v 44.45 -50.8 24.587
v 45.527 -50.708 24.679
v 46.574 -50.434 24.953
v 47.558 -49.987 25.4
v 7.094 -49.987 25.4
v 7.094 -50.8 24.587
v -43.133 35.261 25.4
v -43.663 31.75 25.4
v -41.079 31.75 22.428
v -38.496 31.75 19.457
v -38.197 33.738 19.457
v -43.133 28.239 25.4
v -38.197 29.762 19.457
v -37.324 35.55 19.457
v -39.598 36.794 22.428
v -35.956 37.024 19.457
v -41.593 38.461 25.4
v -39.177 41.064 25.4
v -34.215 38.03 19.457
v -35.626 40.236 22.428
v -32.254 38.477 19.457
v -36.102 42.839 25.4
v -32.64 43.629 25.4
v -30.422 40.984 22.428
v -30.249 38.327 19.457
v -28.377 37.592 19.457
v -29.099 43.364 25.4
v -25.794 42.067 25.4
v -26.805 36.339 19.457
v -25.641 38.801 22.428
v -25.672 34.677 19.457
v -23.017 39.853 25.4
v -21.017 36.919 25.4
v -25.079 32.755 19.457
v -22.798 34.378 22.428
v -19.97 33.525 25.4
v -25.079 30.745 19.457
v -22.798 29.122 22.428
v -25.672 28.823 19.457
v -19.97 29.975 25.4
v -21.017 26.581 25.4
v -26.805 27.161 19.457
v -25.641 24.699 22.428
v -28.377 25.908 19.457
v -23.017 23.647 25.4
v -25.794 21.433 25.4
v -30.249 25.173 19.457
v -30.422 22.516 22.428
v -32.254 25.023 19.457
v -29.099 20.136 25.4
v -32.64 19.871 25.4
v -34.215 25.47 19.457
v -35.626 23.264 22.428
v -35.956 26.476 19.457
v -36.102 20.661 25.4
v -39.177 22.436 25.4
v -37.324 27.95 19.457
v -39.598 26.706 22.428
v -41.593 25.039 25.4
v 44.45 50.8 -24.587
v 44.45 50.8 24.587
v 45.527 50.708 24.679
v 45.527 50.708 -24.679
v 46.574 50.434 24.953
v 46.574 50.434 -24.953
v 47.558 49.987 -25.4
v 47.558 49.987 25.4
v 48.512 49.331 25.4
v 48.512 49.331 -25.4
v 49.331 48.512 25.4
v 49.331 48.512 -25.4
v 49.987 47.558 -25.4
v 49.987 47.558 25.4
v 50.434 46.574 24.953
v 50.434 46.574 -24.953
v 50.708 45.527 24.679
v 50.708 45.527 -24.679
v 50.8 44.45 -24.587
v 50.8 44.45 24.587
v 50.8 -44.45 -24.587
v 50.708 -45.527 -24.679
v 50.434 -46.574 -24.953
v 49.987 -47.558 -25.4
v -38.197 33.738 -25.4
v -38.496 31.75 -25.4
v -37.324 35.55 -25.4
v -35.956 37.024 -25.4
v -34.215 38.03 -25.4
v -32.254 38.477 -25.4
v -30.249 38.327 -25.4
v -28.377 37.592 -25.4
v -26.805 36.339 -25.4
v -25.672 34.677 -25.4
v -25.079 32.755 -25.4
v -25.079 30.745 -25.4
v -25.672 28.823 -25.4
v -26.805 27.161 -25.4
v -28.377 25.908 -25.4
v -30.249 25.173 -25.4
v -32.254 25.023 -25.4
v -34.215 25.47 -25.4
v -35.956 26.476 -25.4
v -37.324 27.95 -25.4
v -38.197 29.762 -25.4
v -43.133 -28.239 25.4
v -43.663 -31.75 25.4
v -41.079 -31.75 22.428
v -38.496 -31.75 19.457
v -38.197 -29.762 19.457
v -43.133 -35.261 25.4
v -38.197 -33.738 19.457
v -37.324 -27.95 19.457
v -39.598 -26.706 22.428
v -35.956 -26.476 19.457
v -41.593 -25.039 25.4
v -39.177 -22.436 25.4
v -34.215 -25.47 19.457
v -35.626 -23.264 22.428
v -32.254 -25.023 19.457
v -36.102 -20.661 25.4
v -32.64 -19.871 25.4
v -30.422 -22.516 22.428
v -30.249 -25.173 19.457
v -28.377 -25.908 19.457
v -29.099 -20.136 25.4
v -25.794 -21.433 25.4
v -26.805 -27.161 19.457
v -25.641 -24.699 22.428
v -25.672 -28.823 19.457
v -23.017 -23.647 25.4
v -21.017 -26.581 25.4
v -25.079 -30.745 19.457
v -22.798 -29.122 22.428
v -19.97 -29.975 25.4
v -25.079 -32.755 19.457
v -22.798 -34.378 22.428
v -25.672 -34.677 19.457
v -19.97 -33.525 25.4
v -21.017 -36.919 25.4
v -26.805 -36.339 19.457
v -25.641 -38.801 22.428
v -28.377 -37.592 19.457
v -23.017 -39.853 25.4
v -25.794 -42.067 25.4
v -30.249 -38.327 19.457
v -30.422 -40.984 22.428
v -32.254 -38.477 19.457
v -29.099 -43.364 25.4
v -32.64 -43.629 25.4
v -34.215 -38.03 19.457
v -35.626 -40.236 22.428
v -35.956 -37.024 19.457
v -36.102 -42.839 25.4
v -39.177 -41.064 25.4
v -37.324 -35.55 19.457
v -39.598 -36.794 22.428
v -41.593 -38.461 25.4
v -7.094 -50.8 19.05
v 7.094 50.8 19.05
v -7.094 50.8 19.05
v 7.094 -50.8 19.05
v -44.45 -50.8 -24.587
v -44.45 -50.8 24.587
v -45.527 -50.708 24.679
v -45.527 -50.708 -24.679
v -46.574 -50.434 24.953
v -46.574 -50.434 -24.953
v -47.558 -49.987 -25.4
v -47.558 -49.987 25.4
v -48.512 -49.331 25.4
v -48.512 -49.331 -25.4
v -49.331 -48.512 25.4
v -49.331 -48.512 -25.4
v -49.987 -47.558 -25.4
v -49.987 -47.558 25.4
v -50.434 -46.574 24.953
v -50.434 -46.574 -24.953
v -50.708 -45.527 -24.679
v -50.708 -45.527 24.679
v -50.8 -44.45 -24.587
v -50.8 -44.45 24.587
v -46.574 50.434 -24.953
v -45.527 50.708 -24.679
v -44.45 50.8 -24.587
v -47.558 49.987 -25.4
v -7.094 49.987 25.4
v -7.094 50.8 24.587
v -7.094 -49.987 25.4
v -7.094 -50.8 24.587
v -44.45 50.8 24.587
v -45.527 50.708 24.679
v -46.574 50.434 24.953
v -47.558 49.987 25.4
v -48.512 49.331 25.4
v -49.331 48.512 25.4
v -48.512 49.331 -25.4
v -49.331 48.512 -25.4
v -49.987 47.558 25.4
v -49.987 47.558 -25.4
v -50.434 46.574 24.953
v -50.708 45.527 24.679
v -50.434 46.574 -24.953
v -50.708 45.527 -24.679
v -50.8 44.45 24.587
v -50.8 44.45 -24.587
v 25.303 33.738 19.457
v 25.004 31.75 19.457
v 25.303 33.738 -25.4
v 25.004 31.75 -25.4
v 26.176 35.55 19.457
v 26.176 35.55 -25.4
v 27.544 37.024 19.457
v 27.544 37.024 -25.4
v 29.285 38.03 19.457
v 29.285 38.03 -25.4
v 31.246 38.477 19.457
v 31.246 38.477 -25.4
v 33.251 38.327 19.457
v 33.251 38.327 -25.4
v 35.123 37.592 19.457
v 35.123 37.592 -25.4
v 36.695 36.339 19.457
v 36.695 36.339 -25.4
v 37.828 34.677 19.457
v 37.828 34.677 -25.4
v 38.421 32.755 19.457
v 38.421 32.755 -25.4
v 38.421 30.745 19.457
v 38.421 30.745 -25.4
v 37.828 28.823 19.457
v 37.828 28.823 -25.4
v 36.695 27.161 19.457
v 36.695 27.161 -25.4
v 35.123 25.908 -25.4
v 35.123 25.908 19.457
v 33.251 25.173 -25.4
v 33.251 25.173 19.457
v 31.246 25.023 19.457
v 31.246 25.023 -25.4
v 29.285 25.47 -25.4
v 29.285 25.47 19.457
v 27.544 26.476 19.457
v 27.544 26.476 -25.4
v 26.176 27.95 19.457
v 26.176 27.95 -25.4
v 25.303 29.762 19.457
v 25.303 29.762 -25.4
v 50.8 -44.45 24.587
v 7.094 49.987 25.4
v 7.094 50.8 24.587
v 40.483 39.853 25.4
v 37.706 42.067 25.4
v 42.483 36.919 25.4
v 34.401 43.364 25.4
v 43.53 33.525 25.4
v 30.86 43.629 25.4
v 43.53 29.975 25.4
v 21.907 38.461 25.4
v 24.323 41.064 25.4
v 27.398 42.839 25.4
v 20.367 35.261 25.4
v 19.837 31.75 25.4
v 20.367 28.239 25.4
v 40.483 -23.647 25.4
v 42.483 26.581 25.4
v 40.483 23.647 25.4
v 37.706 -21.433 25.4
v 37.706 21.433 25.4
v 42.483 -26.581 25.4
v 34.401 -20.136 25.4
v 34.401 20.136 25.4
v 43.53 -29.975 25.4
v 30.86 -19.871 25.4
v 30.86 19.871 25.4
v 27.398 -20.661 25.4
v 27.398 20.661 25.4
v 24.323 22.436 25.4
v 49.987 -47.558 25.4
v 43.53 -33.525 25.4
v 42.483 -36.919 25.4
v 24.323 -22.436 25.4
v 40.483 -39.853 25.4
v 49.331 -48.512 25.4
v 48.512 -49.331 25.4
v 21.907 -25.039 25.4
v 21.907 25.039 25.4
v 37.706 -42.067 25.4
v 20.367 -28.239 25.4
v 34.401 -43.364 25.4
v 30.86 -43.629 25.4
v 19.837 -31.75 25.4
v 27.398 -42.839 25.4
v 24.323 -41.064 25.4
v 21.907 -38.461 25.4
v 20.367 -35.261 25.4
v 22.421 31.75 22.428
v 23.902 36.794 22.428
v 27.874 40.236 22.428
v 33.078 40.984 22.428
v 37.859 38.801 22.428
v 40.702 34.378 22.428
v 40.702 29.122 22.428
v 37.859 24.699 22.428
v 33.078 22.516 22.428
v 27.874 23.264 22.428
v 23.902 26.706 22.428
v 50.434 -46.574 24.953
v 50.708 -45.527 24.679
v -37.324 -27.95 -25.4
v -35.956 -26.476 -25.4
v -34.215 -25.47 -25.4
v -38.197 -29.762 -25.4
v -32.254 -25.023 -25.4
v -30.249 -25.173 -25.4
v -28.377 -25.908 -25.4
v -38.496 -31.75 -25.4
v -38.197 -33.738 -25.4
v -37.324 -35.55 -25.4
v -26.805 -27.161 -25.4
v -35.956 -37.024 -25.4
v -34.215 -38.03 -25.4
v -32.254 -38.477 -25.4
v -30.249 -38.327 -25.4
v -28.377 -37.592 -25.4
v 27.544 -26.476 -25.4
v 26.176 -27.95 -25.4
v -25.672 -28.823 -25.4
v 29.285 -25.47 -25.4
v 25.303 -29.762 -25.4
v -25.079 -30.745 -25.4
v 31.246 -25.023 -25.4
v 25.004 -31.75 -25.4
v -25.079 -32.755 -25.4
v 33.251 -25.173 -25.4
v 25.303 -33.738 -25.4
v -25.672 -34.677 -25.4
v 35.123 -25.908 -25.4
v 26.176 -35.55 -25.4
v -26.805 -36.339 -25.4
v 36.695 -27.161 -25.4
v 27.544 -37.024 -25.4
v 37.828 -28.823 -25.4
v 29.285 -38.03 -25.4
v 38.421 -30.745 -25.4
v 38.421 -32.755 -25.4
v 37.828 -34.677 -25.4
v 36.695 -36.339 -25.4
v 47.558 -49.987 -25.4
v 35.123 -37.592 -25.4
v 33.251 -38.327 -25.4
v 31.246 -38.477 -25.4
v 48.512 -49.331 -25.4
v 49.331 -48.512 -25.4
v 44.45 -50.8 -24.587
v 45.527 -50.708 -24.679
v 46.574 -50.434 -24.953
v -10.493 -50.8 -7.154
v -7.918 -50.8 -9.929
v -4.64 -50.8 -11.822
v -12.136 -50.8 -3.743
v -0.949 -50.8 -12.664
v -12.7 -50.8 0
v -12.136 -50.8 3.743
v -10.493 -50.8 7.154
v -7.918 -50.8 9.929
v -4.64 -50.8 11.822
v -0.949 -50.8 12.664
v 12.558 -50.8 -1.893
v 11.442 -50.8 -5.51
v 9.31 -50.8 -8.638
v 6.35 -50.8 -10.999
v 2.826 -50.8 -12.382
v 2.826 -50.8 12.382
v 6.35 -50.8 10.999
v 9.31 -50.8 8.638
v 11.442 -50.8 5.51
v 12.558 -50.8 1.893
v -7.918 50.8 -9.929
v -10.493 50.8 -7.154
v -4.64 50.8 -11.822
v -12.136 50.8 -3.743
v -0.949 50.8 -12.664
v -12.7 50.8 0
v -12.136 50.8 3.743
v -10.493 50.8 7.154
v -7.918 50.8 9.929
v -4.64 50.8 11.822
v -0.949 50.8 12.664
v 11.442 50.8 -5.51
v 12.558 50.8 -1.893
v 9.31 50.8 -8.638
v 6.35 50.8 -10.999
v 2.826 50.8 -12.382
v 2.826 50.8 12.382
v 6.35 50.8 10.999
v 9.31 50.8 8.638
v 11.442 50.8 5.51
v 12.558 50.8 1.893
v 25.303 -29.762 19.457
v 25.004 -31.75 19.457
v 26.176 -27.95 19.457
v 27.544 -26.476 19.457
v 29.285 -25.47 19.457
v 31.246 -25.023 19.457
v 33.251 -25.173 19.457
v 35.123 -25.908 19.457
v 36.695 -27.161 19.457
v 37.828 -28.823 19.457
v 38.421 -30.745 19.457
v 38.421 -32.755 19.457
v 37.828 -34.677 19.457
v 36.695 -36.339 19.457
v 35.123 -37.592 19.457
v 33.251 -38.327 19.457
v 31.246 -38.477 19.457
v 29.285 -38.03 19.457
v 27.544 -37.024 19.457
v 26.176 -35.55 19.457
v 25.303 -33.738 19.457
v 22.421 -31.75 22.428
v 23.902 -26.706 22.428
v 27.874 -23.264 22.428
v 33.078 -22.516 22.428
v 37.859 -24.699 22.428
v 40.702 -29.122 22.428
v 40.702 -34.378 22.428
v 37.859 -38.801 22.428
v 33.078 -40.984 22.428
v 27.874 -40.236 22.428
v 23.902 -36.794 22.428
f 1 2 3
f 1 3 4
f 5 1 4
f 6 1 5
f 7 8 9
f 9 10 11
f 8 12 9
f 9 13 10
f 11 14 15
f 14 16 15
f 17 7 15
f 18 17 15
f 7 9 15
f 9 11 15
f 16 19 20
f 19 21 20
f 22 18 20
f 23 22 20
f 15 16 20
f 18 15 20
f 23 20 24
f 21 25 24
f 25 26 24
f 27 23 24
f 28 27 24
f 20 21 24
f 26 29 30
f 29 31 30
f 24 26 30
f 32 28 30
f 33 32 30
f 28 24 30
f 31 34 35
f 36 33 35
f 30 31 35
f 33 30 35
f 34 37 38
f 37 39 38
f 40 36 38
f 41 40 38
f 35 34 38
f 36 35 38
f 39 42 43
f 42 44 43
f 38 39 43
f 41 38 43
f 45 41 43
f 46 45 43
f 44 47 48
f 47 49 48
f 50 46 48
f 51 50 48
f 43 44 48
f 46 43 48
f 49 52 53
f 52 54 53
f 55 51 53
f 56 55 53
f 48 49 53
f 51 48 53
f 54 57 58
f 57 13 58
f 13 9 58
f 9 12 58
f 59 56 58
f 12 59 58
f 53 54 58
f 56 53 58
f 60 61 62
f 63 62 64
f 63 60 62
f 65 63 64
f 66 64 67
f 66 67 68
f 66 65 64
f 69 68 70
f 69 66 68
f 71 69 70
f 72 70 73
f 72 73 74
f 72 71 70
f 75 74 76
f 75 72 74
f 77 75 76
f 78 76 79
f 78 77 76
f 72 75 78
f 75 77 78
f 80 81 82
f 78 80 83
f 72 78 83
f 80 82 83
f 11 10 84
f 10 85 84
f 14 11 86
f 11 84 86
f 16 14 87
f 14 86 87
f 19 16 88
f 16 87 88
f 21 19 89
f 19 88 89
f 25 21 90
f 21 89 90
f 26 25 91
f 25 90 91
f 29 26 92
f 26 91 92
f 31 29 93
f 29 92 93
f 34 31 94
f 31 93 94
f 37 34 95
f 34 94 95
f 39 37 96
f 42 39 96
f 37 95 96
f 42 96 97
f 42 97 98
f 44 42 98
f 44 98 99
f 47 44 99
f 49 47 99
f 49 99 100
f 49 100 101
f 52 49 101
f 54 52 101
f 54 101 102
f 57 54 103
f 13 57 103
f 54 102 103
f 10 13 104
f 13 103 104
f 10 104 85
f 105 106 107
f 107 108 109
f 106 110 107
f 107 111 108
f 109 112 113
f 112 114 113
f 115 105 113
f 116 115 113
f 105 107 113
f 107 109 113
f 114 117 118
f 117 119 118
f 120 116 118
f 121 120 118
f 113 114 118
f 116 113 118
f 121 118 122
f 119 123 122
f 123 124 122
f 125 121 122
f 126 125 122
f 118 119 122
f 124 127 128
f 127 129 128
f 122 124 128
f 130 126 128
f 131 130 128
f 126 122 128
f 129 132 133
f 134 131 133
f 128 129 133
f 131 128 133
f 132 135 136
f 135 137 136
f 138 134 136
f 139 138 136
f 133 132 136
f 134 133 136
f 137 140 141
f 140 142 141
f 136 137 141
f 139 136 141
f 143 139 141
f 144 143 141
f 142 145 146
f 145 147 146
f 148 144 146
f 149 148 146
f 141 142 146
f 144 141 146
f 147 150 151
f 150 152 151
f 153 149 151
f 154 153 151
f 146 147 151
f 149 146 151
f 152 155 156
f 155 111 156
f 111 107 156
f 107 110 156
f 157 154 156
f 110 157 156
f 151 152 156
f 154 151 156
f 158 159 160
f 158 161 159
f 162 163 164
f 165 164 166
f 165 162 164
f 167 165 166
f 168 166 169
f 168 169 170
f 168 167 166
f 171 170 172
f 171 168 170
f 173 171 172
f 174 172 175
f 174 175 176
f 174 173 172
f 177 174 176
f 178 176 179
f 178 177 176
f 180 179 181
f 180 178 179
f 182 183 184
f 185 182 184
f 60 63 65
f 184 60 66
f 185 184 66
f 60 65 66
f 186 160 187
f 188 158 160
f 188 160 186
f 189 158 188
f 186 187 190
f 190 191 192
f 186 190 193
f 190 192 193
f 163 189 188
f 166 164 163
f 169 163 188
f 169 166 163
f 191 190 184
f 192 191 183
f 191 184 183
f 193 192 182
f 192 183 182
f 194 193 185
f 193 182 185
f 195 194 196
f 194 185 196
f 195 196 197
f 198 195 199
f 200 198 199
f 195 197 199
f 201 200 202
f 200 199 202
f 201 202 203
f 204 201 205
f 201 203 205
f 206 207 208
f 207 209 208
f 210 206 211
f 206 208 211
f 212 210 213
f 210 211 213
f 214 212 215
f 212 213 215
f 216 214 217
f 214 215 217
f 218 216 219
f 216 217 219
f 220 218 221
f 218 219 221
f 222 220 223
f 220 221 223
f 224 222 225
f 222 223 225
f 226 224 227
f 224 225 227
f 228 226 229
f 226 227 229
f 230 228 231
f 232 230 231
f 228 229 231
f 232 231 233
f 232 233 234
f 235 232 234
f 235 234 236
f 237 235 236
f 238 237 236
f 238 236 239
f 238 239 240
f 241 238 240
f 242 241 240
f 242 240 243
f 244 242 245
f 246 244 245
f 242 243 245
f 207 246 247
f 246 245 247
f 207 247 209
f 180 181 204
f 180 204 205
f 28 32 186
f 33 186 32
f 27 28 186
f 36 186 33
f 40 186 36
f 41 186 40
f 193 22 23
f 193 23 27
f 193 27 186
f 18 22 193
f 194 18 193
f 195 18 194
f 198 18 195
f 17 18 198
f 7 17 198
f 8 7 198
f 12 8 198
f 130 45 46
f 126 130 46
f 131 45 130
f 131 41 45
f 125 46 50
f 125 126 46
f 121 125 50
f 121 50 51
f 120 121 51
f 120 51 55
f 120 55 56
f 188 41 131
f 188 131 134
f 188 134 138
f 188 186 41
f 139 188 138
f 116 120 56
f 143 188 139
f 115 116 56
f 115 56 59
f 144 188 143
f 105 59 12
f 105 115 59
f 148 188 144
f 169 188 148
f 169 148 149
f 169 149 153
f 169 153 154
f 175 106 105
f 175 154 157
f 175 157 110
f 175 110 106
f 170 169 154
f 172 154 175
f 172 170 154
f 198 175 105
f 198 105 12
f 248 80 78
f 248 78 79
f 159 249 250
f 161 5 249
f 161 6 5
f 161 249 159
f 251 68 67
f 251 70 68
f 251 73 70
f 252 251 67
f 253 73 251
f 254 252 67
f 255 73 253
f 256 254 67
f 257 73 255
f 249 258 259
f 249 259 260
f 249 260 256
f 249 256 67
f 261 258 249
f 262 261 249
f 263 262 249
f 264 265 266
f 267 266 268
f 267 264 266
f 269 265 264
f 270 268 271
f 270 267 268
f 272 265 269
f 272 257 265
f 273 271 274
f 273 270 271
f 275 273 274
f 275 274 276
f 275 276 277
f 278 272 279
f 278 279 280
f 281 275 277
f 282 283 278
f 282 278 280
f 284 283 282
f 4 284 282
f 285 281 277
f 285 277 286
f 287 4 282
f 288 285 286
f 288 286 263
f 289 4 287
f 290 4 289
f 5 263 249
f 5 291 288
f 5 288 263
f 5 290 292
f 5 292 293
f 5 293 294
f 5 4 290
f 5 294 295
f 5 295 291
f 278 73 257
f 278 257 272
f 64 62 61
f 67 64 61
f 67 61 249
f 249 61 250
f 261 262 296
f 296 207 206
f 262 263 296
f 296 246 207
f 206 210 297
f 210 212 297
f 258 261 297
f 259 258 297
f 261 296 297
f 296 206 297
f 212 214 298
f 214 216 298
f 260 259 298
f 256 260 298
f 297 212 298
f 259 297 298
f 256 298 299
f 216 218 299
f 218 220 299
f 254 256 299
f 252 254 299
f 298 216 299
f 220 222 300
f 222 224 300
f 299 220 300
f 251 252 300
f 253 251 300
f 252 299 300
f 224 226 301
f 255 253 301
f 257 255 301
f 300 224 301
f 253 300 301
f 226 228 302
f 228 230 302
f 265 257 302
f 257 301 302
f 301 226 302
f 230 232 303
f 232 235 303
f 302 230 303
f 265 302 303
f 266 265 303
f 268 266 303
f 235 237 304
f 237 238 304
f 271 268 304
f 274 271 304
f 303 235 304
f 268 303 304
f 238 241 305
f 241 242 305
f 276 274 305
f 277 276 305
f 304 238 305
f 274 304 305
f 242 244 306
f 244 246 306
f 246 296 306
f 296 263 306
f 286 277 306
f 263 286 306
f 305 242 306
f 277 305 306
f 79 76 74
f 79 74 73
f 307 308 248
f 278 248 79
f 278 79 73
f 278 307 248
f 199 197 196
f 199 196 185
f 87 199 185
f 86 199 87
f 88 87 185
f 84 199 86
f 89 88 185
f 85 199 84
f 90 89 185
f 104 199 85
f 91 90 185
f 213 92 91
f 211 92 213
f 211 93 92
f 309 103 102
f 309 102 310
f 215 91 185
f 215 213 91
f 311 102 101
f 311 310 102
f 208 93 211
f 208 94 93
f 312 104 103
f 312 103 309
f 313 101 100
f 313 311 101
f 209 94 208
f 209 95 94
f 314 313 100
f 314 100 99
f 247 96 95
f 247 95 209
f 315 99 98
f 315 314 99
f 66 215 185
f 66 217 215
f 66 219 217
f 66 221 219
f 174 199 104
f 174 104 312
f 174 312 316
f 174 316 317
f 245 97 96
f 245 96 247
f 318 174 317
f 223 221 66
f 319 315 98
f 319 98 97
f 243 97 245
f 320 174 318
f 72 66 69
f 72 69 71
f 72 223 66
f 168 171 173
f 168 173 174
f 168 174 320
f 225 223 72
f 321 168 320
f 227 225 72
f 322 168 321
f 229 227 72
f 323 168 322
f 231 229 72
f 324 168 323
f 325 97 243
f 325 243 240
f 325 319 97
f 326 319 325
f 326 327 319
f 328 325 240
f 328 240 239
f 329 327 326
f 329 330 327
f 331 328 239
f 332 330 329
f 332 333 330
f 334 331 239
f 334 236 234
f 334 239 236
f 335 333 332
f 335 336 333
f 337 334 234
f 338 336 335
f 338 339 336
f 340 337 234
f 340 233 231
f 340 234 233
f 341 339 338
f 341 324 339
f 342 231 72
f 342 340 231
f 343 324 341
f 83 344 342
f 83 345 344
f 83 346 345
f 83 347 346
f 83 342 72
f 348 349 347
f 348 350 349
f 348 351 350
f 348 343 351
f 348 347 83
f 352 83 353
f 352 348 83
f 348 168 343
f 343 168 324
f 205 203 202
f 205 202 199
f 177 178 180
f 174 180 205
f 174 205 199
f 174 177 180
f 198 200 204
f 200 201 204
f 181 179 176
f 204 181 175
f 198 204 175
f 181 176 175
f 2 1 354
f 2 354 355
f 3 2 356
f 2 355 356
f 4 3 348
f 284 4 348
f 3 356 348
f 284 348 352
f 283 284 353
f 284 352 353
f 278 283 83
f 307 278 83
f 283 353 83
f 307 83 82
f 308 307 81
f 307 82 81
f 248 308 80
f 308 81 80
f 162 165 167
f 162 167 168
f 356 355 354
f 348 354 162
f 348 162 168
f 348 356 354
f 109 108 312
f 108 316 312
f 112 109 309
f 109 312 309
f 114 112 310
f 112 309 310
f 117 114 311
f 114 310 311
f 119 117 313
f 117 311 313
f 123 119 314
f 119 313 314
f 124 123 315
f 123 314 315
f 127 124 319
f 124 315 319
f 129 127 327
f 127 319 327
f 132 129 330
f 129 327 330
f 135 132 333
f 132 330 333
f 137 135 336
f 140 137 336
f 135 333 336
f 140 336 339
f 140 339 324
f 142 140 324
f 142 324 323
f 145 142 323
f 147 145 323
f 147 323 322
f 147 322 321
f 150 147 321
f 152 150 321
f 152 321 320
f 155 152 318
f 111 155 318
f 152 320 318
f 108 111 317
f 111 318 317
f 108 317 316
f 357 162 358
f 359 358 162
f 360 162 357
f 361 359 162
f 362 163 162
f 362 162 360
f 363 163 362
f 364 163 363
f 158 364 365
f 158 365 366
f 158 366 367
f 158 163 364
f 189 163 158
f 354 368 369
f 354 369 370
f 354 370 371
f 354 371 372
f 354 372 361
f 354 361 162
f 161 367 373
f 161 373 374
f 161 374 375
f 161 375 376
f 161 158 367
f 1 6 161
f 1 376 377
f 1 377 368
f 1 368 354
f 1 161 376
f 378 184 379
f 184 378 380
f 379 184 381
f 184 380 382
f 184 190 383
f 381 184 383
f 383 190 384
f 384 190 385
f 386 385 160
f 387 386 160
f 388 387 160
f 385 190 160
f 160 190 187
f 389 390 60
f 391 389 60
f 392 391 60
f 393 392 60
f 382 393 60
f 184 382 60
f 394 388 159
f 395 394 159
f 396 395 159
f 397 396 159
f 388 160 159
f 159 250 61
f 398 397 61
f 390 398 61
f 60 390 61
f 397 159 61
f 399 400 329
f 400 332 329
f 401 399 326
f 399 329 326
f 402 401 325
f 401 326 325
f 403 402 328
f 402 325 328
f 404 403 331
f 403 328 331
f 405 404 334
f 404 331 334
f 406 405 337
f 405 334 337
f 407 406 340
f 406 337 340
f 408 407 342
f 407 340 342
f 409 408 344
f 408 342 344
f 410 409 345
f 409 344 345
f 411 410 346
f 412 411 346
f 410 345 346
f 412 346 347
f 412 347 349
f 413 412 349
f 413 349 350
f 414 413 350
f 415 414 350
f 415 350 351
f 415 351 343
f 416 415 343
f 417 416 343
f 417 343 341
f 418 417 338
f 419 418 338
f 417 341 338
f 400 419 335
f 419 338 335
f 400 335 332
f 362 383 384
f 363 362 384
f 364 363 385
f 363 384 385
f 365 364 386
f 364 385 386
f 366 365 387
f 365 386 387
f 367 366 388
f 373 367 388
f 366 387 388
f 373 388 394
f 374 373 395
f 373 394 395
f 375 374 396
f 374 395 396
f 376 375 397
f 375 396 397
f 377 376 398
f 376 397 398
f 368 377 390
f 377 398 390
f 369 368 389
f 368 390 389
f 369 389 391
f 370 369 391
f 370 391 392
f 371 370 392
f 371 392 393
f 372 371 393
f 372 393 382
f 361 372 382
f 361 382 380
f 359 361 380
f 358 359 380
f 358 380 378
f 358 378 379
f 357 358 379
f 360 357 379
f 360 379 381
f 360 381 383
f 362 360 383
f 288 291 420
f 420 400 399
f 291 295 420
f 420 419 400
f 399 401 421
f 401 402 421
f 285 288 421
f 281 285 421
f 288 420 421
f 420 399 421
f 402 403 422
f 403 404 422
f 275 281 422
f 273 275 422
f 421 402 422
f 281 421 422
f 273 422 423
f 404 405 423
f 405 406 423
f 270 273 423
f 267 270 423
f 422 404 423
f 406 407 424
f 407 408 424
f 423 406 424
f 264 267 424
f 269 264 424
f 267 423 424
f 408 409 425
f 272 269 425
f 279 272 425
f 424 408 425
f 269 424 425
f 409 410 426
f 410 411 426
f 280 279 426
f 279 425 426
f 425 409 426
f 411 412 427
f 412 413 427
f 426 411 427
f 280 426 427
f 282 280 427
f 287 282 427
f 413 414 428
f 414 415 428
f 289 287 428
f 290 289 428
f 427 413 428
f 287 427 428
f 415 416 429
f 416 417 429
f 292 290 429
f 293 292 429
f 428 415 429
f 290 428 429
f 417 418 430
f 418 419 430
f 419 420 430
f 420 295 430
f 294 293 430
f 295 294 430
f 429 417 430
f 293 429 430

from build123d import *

# Parameters (mm, degrees)
F1_DEPTH       = 50.8
F3_D           = 13.49248
F3_CSINK_D     = 23.8252
F3_CSINK_ANGLE = 82
F4_SIZE        = 0.8128
F5_T1_DEPTH    = 80.9244
F7_D           = 25.4


# Not quite as in the source:
# - a fillet or chamfer that OpenCascade refuses, or shapes differently, is made with other operations: its cross-section is extruded or revolved along the edge and cut away or added


with BuildPart() as f1:
    # F0 (on Front) → F1 (new body, symmetric)
    with BuildSketch(Plane.XZ):
        Polygon((-7.0944838226, 25.4), (-50.8, 25.4), (-50.8, -25.4), (50.8, -25.4), (50.8, 25.4), (7.0944838226, 25.4), (7.0944838226, 19.05), (0, 19.05), (-7.0944838226, 19.05), align=None)
    extrude(amount=F1_DEPTH, both=True)

    # F3 (through all)
    with Locations(Plane.XY.offset(25.4)):
        with Locations((-31.75, 31.75), (31.75, 31.75), (31.75, -31.75), (-31.75, -31.75)):
            CounterSinkHole(F3_D / 2, F3_CSINK_D / 2, counter_sink_angle=F3_CSINK_ANGLE)

    # F4
    f4_edges = [f1.edges().sort_by_distance(p)[0] for p in [
        (-50.8, 0, 25.4),
        (50.8, 0, 25.4),
        (0, -50.8, -25.4),
        (-50.8, 0, -25.4),
        (0, 50.8, -25.4),
        (50.8, 0, -25.4),
        (-28.947242, -50.8, 25.4),
        (28.947242, -50.8, 25.4),
        (28.947242, 50.8, 25.4),
        (-28.947242, 50.8, 25.4),
    ]]
    chamfer(f4_edges, length=F4_SIZE)

    # F5: fillet of radius 6.35 on 4 edges, made by hand

    # F5_s2 → F5_t1 (cut)
    with BuildSketch(Plane.XY.offset(-40.4622)):
        with BuildLine():
            ThreePointArc((-44.45, -50.8), (-48.9401280605, -48.9401280605), (-50.8, -44.45))
            Line((-50.8, -44.45), (-50.8, -50.8))
            Line((-50.8, -50.8), (-44.45, -50.8))
        make_face()
        with BuildLine():
            ThreePointArc((44.45, -50.8), (48.9401280605, -48.9401280605), (50.8, -44.45))
            Line((50.8, -44.45), (50.8, -50.8))
            Line((50.8, -50.8), (44.45, -50.8))
        make_face()
        with BuildLine():
            ThreePointArc((44.45, 50.8), (48.9401280605, 48.9401280605), (50.8, 44.45))
            Line((50.8, 44.45), (50.8, 50.8))
            Line((50.8, 50.8), (44.45, 50.8))
        make_face()
        with BuildLine():
            ThreePointArc((-44.45, 50.8), (-48.9401280605, 48.9401280605), (-50.8, 44.45))
            Line((-50.8, 44.45), (-50.8, 50.8))
            Line((-50.8, 50.8), (-44.45, 50.8))
        make_face()
    extrude(amount=F5_T1_DEPTH, mode=Mode.SUBTRACT)

    # F7 (through all)
    with Locations(Plane.XZ.offset(50.8)):
        with Locations((0, 0)):
            Hole(F7_D / 2)


solid = f1.part
